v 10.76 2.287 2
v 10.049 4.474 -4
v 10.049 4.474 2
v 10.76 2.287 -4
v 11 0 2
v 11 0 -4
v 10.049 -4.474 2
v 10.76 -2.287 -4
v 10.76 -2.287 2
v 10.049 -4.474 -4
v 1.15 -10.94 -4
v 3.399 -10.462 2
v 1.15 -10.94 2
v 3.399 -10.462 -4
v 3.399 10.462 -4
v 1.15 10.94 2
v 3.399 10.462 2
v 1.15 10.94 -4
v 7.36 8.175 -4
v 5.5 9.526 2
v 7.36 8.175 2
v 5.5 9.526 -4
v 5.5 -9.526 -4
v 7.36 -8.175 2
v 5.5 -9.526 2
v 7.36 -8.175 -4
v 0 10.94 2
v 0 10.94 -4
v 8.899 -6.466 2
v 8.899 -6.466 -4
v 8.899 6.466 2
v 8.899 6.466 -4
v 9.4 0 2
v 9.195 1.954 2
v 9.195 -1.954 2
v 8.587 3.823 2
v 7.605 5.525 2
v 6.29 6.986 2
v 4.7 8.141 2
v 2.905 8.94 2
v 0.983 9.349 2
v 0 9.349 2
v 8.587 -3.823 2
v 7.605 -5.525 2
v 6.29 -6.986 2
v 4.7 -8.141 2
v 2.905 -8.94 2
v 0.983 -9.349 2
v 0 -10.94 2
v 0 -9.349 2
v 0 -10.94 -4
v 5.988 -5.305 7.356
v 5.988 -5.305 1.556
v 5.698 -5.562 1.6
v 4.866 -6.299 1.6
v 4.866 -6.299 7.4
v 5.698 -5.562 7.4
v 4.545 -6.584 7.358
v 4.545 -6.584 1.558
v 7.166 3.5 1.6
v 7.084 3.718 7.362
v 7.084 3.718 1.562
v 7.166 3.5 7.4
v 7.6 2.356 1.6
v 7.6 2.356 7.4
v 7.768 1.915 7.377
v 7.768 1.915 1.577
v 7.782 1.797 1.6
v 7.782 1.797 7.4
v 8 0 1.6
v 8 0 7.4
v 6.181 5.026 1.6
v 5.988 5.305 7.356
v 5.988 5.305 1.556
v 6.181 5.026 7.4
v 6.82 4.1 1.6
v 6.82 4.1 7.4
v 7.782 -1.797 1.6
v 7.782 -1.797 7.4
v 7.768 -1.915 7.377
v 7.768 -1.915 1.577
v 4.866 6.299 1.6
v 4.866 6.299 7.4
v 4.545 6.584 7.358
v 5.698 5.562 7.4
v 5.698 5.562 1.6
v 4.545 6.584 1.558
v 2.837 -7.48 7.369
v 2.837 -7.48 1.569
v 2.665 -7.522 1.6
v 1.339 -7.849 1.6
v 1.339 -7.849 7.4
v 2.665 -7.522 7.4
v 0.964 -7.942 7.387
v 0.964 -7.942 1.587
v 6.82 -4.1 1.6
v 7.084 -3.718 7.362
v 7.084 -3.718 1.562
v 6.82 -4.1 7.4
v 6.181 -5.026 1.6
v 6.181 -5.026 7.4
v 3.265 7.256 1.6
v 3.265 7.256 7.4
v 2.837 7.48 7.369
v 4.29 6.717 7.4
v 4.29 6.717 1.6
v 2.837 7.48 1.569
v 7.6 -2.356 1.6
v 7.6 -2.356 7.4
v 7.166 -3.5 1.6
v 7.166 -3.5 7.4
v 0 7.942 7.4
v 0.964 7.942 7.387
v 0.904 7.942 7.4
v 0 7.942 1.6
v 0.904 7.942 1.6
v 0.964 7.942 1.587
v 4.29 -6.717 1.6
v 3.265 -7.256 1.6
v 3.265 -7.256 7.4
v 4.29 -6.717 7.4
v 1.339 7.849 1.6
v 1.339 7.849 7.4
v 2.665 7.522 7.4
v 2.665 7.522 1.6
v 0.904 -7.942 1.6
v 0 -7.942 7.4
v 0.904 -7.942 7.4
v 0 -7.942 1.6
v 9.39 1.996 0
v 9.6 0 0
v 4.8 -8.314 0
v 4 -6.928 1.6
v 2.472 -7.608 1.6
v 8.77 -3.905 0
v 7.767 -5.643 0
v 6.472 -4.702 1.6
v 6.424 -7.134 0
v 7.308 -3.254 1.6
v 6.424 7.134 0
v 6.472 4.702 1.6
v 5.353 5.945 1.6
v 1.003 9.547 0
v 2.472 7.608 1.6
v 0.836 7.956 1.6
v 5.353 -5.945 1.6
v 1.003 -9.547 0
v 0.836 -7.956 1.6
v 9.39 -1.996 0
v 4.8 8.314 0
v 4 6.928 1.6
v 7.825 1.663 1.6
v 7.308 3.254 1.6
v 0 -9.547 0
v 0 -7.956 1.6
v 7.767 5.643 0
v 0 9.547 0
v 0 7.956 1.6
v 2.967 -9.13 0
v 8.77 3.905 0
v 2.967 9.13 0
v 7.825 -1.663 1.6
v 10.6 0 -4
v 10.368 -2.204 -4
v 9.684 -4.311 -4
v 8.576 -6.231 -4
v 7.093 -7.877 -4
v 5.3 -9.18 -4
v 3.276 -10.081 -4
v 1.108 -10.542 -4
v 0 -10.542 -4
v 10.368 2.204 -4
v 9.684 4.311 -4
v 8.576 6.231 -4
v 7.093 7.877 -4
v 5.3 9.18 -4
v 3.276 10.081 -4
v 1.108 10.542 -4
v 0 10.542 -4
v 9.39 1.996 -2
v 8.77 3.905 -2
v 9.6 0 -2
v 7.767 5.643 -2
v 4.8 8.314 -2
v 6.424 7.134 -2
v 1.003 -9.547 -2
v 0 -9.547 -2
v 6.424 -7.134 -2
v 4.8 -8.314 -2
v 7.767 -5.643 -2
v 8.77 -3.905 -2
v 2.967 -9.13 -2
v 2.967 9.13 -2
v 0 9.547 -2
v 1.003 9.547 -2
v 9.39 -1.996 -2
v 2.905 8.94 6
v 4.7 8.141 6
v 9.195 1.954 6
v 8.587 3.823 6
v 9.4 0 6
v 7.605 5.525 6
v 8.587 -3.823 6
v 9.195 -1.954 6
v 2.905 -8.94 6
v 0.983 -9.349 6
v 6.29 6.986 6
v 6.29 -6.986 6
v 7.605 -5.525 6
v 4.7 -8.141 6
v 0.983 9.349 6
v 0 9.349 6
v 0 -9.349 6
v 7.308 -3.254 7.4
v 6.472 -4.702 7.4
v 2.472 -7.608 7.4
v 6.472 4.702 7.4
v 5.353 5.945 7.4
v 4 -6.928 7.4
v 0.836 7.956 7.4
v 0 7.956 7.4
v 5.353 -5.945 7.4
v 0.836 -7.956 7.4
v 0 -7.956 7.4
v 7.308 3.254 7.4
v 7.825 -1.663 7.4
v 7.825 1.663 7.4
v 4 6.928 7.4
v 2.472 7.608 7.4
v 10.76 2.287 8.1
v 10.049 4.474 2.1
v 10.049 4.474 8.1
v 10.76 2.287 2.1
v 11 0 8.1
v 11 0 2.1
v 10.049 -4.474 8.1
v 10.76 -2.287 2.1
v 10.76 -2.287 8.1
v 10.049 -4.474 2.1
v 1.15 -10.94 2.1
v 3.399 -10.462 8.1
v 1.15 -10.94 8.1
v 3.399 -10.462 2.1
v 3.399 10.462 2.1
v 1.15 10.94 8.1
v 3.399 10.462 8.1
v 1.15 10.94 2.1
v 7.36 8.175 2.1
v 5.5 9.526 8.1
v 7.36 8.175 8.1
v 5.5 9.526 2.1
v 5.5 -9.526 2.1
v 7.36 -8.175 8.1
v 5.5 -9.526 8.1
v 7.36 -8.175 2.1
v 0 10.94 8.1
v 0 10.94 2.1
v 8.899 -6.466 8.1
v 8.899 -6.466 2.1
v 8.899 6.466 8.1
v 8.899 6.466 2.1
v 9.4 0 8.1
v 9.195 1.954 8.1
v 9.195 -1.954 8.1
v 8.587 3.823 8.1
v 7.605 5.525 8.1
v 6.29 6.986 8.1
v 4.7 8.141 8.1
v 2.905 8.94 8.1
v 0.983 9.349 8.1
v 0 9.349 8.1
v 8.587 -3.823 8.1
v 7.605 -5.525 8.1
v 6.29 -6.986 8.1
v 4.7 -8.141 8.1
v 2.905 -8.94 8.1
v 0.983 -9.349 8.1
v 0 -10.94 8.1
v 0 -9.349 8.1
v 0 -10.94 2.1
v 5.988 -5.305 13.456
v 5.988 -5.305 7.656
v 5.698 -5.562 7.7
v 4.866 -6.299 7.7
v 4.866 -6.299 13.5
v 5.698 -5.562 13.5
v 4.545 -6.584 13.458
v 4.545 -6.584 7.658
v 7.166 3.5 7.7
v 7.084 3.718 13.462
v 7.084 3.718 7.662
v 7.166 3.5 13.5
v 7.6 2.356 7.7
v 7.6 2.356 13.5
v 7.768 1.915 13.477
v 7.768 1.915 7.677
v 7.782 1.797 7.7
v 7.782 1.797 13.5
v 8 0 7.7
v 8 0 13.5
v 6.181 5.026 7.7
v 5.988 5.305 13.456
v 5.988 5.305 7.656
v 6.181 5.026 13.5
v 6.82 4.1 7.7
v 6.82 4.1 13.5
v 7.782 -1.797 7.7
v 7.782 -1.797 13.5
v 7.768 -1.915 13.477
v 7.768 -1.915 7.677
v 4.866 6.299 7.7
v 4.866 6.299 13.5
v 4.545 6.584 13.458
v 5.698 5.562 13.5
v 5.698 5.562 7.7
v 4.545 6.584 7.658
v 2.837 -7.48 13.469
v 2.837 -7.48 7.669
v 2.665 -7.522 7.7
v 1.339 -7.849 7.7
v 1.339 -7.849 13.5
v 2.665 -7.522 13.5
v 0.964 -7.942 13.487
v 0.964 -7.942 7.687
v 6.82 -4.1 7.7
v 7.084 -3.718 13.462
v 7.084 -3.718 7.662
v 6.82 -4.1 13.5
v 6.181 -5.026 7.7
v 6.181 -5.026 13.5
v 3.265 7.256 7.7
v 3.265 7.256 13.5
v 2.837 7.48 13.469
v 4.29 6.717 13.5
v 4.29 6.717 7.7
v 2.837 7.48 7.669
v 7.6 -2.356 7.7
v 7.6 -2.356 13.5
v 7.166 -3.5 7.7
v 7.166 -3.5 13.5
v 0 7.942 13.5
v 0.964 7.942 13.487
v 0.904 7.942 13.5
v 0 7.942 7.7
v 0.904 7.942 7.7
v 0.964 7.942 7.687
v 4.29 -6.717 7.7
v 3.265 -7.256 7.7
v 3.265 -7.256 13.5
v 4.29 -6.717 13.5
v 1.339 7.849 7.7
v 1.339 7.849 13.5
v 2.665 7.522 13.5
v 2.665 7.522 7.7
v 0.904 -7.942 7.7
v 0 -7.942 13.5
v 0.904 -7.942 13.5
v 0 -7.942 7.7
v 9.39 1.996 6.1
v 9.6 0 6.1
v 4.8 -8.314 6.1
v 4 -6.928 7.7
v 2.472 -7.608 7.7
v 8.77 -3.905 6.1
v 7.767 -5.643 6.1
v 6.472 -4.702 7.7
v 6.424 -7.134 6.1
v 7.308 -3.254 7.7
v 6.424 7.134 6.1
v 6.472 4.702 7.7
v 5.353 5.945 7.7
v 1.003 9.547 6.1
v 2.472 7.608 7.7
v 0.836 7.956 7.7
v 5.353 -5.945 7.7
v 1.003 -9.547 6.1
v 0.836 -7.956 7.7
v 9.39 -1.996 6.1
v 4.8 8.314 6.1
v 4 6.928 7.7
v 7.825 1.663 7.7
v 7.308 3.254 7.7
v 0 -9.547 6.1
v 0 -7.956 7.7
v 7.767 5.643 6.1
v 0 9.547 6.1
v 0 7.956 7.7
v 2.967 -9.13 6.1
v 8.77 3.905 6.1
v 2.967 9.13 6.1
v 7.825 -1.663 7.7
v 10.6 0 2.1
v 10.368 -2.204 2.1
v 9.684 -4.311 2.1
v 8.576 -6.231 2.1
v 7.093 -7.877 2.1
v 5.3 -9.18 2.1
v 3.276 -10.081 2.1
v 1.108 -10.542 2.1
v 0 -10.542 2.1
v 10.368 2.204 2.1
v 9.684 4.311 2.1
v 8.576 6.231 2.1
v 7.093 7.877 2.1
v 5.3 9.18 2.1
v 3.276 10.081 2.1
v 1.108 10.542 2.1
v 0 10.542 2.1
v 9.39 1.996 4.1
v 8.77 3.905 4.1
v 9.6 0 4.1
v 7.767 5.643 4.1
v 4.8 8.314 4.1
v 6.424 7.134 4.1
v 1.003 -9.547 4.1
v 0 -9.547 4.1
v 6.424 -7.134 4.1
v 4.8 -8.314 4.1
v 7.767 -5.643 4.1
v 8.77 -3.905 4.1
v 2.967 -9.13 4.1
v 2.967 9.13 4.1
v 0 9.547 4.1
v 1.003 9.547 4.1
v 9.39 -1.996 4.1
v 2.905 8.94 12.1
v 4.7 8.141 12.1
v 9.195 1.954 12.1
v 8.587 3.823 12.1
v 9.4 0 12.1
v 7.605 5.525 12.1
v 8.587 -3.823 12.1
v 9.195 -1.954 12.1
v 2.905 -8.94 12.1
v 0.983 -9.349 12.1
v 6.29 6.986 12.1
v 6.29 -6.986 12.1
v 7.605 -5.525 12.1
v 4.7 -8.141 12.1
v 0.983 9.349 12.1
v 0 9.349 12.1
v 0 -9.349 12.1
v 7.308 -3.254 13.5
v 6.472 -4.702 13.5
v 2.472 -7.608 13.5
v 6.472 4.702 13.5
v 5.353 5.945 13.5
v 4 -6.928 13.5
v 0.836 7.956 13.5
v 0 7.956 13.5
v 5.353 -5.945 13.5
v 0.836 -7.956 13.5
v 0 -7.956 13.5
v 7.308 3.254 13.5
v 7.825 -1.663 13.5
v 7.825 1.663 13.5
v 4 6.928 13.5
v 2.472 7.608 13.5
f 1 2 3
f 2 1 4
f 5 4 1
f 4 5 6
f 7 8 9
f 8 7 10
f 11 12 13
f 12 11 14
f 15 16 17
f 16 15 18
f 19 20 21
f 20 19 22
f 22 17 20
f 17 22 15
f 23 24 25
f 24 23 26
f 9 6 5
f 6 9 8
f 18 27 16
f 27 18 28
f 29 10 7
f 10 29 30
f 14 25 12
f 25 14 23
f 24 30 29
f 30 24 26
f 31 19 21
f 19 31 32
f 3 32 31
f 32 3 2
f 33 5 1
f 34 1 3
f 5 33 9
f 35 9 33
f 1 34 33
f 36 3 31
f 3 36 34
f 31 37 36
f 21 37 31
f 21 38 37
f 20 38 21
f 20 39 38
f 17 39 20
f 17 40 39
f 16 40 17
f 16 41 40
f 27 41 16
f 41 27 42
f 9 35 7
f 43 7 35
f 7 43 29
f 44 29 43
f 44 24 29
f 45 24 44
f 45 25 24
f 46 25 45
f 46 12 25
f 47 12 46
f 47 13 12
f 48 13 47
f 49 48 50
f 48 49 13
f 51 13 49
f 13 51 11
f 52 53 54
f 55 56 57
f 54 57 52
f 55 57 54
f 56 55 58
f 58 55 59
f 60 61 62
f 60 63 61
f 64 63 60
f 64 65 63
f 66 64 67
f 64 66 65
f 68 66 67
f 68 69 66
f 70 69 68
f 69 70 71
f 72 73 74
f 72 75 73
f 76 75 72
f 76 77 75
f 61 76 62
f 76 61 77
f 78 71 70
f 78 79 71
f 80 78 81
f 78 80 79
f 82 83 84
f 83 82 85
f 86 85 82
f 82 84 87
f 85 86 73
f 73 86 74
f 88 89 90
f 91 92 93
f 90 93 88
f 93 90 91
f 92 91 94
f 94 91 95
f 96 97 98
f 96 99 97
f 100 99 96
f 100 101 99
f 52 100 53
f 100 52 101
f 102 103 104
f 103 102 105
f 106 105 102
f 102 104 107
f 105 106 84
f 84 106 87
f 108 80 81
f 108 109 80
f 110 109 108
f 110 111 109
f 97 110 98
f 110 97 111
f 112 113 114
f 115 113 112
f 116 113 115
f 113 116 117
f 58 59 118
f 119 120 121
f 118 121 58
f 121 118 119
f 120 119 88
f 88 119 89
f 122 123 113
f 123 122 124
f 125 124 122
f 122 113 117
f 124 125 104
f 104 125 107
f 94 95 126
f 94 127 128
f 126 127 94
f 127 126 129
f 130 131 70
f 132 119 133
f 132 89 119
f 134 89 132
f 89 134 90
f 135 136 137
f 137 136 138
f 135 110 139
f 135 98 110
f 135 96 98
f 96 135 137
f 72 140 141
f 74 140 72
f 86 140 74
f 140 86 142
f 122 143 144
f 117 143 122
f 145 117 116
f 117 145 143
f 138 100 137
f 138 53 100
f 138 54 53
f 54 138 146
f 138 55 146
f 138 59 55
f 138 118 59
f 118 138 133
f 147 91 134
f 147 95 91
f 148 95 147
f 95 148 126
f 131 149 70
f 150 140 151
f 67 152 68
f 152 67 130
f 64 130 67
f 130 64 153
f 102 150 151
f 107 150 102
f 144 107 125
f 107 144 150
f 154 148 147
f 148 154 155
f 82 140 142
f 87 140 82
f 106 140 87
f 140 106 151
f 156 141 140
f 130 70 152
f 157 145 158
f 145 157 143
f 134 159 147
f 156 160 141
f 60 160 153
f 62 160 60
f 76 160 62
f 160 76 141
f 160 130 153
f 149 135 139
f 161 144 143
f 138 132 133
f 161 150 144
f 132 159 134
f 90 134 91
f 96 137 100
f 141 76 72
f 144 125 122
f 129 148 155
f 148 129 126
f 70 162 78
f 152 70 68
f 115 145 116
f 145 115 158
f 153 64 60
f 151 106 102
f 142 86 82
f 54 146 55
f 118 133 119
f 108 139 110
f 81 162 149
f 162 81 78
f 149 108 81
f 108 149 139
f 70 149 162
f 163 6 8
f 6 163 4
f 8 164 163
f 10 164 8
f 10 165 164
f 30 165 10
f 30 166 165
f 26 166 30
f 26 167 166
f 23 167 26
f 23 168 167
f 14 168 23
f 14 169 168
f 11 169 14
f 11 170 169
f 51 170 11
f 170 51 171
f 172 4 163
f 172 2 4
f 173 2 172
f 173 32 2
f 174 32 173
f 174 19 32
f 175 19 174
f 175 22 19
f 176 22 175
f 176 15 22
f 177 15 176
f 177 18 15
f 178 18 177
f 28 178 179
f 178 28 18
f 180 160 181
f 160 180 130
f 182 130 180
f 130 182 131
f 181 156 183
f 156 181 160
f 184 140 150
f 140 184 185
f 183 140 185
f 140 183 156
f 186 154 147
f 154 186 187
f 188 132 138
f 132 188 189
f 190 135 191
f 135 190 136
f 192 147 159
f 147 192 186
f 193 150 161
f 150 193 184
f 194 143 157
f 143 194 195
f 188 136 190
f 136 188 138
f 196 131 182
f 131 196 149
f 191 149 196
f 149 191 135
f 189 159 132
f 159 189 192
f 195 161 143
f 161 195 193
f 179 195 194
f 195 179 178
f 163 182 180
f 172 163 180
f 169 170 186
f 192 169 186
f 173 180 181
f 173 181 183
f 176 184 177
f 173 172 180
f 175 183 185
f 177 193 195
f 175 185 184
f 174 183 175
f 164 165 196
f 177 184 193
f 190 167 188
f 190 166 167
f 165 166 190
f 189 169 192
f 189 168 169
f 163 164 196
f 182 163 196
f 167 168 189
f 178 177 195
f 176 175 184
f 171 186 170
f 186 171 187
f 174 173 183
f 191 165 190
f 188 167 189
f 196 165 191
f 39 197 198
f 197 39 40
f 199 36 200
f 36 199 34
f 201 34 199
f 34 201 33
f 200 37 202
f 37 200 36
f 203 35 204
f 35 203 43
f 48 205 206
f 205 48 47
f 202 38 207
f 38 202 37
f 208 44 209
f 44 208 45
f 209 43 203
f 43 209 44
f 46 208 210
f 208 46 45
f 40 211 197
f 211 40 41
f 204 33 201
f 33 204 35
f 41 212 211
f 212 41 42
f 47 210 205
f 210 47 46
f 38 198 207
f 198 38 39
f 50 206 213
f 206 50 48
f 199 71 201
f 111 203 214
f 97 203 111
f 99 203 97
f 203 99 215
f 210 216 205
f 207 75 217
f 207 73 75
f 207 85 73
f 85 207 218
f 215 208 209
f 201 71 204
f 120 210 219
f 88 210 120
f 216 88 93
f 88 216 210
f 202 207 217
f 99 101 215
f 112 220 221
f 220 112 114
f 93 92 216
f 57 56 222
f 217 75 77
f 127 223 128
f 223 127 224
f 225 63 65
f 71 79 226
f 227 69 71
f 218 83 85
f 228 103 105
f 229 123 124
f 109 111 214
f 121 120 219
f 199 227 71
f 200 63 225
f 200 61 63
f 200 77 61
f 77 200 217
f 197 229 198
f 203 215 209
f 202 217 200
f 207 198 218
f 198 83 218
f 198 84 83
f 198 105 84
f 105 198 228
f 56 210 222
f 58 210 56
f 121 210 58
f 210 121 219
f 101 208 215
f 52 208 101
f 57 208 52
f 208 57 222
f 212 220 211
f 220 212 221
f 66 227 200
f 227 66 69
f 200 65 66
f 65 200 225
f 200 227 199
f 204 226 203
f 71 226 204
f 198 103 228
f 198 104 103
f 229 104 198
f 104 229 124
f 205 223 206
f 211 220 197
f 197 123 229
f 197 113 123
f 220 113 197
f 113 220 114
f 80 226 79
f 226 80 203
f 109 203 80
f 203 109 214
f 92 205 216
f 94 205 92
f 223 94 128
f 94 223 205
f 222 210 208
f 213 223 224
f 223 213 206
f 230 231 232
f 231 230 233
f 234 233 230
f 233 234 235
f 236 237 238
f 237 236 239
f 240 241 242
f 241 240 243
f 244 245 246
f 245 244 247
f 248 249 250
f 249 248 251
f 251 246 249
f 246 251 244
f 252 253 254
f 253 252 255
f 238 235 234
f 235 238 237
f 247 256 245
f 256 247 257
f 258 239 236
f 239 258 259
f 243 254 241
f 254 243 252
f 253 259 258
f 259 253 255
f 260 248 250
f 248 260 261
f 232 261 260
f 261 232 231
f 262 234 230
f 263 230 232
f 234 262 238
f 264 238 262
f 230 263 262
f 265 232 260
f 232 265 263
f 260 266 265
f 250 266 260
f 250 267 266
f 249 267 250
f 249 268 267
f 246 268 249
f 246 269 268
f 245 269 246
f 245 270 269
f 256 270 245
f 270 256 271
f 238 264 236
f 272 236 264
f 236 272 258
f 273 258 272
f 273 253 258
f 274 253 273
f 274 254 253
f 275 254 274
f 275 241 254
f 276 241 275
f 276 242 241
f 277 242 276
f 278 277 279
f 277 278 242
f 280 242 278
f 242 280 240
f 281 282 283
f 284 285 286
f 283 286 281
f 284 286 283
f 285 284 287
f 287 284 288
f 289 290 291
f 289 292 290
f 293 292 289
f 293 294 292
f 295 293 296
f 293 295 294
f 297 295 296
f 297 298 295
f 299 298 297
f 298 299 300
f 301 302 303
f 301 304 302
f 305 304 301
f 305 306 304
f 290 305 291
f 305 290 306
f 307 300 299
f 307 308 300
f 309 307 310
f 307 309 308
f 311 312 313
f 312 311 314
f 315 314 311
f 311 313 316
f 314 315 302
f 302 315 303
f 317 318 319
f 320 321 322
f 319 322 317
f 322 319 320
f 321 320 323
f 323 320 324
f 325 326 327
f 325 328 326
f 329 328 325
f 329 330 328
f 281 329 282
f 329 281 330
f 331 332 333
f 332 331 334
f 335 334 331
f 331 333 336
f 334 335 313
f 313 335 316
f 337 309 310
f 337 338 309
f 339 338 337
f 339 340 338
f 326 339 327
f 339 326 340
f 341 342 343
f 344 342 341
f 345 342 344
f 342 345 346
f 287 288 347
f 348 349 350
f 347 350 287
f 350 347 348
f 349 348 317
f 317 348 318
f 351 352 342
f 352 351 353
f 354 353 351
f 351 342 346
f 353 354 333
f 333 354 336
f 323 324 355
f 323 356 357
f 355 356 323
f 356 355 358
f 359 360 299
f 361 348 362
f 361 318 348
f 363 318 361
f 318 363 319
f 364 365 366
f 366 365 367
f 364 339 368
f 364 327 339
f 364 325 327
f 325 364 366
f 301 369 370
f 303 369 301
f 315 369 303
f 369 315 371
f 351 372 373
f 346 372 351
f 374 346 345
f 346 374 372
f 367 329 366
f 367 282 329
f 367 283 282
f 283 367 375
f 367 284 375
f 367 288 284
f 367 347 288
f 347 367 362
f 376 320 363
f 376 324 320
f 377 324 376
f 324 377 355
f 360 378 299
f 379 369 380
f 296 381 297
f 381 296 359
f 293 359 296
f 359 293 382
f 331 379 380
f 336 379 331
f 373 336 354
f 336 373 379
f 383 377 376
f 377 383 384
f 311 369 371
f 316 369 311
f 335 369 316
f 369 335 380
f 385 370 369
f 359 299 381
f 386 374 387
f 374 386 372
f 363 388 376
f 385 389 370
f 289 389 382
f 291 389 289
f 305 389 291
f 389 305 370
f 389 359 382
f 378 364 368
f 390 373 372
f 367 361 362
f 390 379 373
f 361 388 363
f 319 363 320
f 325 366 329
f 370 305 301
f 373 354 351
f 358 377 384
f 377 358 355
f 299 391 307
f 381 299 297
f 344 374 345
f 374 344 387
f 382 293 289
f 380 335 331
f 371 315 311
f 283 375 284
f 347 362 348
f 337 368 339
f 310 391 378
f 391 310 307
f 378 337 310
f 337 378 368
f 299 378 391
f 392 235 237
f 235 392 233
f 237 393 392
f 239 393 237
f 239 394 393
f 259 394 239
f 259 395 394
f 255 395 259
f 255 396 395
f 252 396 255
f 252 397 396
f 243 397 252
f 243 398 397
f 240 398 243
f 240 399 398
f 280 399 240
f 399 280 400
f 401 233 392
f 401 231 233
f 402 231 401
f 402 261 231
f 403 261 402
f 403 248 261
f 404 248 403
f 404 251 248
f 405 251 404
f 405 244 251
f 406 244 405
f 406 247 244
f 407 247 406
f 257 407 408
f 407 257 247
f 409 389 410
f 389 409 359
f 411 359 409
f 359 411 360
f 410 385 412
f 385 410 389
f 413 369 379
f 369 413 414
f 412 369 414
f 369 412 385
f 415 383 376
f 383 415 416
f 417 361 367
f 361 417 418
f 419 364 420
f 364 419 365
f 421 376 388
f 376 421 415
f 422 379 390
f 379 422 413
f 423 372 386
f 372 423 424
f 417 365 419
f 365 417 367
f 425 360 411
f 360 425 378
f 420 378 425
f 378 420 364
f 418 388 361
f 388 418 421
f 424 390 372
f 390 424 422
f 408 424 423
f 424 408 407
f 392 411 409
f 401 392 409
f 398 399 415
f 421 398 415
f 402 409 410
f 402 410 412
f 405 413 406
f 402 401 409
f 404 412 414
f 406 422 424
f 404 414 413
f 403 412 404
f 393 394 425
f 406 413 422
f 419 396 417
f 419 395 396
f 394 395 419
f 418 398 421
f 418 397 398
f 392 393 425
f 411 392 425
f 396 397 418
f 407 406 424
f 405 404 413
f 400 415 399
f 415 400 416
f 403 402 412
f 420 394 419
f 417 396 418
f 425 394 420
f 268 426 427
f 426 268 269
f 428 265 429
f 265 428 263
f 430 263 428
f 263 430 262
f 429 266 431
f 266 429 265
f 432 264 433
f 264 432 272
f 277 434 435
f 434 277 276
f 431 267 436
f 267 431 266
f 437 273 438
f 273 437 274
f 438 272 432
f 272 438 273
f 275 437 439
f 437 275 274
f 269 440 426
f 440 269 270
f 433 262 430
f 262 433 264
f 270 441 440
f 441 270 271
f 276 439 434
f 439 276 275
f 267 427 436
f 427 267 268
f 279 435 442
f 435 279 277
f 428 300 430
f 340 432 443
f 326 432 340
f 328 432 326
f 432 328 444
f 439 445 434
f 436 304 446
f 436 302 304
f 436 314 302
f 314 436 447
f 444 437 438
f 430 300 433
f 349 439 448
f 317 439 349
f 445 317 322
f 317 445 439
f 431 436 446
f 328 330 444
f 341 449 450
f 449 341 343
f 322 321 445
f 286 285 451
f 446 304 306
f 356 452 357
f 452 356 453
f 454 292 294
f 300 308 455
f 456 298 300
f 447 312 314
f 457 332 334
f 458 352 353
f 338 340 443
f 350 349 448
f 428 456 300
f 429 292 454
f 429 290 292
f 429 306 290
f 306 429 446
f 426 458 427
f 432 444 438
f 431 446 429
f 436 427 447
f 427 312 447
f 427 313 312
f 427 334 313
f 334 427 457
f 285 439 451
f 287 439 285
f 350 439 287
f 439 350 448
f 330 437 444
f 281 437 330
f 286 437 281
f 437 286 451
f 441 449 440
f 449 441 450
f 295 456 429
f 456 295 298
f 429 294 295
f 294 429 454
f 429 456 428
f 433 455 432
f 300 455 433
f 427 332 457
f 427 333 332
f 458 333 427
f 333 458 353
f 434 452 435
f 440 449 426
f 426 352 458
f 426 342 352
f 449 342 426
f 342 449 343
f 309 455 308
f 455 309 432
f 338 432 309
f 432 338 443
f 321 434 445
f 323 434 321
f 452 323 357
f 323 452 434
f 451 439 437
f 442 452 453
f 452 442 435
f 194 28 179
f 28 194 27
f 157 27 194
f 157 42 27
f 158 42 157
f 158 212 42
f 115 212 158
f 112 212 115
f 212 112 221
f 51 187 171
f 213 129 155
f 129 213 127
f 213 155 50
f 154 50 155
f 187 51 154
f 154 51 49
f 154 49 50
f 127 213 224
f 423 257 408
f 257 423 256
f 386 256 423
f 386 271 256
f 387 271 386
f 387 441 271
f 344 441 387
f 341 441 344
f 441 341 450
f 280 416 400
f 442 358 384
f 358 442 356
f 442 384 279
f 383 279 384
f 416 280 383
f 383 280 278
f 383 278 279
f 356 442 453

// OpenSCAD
// file: segment.scad
use <coupler.scad>;
// Section

module pipe(inner, outer, length) {
  difference() {
    cylinder(r=outer, h=length);
    cylinder(r=inner, h=length);
  }
}

function bevel_height(inner, outer, gap=0.1) = (outer-inner)/2 + gap;

module bevel(inner, outer){
  w = (outer - inner);
  difference(){
    cylinder(r1=inner+w,r2=inner,h=w);
    cylinder(r=inner,h=w);
  }
}

module segment(inner, outer, length, gap=0.1) {
  w = (outer-inner)/2;
  union() {
    difference(){
      pipe(inner, outer, length);
      bevel(inner, outer+gap-w);
    }
    translate([0,0,-coupler_height()]) 
      coupler(inner, outer, false);
    translate([0,0,length + coupler_height()]) {
      coupler(inner, outer, true);
      bevel(inner, inner+w-gap);
    }
  }
}

module first_segment(inner, outer, length, gap=0.1) {
  w = (outer-inner)/2;
  union() {
    pipe(inner, outer, length);
    translate([0,0,length + coupler_height()]) {
      coupler(inner, outer, true);
      bevel(inner, inner+w-gap);
    }
  }
}

module last_segment(inner, outer, length, gap=0.1) {
  w = (outer-inner)/2;
  union() {
    difference(){
      pipe(inner, outer, length);
      bevel(inner, outer+gap-w);
    }
    translate([0,0,-coupler_height()]) 
      coupler(inner, outer, false);
  }
}

d = [4,6,2];

difference() {
  union() {
    first_segment(d.x, d.y, d.z);
    translate([0,0,d.z + coupler_height() + 0.1])
      segment(d.x, d.y, d.z);
    translate([0,0,2*(d.z + coupler_height() + 0.1)])
      last_segment(d.x, d.y, d.z);
  }
  translate([-20,0,0]) cube([50,50,50]);
}
// main file
use <segment.scad>;

function coupler_height () = 4;

// function gap = 0.4;
elephant_toe = 0.4;

module coupler(inner, outer, is_at_top, gap=0.1){
  h = coupler_height();
  w = (outer - inner) / 2;
  if (is_at_top) {
    translate([0,0,-h]) 
      pipe(inner, outer-w-gap, h);
  } else {
    difference() {
      pipe(inner+w+gap, outer, h);
      cylinder(r2=inner+w+gap, r1=outer-elephant_toe, h/2);
    }

  }
}

module offset_check(){
  intersection(){
    translate([0,-25,-25]) cube([50,50,50]);
    union(){
      segment(8,11,2);
      translate([0,0,2+coupler_height()+.1]) segment(8,11,2);
    }
  }
}

module coupler_tests() {
  // use comprehension to make vector of [gap, [dx, dy]] for one big stl
  gaps = [for (i=[0.0:0.05:0.2]) each [i,i]];
  r = 11;
  dr = r + 3;
  offsets = [for (x=[0:len(gaps)]) each [for (y=[0:1]) [dr*x,dr*y,0]]];
  for (i=[0:len(gaps)-1]) {
    // echo("i:", i, gaps[i], offsets[i]);
    translate(offsets[i]) segment(8/2,11/2,4,gaps[i]);
  }
}

// $fn=100;
// coupler_tests();
offset_check();
// segment(8,11,4,0.1);
